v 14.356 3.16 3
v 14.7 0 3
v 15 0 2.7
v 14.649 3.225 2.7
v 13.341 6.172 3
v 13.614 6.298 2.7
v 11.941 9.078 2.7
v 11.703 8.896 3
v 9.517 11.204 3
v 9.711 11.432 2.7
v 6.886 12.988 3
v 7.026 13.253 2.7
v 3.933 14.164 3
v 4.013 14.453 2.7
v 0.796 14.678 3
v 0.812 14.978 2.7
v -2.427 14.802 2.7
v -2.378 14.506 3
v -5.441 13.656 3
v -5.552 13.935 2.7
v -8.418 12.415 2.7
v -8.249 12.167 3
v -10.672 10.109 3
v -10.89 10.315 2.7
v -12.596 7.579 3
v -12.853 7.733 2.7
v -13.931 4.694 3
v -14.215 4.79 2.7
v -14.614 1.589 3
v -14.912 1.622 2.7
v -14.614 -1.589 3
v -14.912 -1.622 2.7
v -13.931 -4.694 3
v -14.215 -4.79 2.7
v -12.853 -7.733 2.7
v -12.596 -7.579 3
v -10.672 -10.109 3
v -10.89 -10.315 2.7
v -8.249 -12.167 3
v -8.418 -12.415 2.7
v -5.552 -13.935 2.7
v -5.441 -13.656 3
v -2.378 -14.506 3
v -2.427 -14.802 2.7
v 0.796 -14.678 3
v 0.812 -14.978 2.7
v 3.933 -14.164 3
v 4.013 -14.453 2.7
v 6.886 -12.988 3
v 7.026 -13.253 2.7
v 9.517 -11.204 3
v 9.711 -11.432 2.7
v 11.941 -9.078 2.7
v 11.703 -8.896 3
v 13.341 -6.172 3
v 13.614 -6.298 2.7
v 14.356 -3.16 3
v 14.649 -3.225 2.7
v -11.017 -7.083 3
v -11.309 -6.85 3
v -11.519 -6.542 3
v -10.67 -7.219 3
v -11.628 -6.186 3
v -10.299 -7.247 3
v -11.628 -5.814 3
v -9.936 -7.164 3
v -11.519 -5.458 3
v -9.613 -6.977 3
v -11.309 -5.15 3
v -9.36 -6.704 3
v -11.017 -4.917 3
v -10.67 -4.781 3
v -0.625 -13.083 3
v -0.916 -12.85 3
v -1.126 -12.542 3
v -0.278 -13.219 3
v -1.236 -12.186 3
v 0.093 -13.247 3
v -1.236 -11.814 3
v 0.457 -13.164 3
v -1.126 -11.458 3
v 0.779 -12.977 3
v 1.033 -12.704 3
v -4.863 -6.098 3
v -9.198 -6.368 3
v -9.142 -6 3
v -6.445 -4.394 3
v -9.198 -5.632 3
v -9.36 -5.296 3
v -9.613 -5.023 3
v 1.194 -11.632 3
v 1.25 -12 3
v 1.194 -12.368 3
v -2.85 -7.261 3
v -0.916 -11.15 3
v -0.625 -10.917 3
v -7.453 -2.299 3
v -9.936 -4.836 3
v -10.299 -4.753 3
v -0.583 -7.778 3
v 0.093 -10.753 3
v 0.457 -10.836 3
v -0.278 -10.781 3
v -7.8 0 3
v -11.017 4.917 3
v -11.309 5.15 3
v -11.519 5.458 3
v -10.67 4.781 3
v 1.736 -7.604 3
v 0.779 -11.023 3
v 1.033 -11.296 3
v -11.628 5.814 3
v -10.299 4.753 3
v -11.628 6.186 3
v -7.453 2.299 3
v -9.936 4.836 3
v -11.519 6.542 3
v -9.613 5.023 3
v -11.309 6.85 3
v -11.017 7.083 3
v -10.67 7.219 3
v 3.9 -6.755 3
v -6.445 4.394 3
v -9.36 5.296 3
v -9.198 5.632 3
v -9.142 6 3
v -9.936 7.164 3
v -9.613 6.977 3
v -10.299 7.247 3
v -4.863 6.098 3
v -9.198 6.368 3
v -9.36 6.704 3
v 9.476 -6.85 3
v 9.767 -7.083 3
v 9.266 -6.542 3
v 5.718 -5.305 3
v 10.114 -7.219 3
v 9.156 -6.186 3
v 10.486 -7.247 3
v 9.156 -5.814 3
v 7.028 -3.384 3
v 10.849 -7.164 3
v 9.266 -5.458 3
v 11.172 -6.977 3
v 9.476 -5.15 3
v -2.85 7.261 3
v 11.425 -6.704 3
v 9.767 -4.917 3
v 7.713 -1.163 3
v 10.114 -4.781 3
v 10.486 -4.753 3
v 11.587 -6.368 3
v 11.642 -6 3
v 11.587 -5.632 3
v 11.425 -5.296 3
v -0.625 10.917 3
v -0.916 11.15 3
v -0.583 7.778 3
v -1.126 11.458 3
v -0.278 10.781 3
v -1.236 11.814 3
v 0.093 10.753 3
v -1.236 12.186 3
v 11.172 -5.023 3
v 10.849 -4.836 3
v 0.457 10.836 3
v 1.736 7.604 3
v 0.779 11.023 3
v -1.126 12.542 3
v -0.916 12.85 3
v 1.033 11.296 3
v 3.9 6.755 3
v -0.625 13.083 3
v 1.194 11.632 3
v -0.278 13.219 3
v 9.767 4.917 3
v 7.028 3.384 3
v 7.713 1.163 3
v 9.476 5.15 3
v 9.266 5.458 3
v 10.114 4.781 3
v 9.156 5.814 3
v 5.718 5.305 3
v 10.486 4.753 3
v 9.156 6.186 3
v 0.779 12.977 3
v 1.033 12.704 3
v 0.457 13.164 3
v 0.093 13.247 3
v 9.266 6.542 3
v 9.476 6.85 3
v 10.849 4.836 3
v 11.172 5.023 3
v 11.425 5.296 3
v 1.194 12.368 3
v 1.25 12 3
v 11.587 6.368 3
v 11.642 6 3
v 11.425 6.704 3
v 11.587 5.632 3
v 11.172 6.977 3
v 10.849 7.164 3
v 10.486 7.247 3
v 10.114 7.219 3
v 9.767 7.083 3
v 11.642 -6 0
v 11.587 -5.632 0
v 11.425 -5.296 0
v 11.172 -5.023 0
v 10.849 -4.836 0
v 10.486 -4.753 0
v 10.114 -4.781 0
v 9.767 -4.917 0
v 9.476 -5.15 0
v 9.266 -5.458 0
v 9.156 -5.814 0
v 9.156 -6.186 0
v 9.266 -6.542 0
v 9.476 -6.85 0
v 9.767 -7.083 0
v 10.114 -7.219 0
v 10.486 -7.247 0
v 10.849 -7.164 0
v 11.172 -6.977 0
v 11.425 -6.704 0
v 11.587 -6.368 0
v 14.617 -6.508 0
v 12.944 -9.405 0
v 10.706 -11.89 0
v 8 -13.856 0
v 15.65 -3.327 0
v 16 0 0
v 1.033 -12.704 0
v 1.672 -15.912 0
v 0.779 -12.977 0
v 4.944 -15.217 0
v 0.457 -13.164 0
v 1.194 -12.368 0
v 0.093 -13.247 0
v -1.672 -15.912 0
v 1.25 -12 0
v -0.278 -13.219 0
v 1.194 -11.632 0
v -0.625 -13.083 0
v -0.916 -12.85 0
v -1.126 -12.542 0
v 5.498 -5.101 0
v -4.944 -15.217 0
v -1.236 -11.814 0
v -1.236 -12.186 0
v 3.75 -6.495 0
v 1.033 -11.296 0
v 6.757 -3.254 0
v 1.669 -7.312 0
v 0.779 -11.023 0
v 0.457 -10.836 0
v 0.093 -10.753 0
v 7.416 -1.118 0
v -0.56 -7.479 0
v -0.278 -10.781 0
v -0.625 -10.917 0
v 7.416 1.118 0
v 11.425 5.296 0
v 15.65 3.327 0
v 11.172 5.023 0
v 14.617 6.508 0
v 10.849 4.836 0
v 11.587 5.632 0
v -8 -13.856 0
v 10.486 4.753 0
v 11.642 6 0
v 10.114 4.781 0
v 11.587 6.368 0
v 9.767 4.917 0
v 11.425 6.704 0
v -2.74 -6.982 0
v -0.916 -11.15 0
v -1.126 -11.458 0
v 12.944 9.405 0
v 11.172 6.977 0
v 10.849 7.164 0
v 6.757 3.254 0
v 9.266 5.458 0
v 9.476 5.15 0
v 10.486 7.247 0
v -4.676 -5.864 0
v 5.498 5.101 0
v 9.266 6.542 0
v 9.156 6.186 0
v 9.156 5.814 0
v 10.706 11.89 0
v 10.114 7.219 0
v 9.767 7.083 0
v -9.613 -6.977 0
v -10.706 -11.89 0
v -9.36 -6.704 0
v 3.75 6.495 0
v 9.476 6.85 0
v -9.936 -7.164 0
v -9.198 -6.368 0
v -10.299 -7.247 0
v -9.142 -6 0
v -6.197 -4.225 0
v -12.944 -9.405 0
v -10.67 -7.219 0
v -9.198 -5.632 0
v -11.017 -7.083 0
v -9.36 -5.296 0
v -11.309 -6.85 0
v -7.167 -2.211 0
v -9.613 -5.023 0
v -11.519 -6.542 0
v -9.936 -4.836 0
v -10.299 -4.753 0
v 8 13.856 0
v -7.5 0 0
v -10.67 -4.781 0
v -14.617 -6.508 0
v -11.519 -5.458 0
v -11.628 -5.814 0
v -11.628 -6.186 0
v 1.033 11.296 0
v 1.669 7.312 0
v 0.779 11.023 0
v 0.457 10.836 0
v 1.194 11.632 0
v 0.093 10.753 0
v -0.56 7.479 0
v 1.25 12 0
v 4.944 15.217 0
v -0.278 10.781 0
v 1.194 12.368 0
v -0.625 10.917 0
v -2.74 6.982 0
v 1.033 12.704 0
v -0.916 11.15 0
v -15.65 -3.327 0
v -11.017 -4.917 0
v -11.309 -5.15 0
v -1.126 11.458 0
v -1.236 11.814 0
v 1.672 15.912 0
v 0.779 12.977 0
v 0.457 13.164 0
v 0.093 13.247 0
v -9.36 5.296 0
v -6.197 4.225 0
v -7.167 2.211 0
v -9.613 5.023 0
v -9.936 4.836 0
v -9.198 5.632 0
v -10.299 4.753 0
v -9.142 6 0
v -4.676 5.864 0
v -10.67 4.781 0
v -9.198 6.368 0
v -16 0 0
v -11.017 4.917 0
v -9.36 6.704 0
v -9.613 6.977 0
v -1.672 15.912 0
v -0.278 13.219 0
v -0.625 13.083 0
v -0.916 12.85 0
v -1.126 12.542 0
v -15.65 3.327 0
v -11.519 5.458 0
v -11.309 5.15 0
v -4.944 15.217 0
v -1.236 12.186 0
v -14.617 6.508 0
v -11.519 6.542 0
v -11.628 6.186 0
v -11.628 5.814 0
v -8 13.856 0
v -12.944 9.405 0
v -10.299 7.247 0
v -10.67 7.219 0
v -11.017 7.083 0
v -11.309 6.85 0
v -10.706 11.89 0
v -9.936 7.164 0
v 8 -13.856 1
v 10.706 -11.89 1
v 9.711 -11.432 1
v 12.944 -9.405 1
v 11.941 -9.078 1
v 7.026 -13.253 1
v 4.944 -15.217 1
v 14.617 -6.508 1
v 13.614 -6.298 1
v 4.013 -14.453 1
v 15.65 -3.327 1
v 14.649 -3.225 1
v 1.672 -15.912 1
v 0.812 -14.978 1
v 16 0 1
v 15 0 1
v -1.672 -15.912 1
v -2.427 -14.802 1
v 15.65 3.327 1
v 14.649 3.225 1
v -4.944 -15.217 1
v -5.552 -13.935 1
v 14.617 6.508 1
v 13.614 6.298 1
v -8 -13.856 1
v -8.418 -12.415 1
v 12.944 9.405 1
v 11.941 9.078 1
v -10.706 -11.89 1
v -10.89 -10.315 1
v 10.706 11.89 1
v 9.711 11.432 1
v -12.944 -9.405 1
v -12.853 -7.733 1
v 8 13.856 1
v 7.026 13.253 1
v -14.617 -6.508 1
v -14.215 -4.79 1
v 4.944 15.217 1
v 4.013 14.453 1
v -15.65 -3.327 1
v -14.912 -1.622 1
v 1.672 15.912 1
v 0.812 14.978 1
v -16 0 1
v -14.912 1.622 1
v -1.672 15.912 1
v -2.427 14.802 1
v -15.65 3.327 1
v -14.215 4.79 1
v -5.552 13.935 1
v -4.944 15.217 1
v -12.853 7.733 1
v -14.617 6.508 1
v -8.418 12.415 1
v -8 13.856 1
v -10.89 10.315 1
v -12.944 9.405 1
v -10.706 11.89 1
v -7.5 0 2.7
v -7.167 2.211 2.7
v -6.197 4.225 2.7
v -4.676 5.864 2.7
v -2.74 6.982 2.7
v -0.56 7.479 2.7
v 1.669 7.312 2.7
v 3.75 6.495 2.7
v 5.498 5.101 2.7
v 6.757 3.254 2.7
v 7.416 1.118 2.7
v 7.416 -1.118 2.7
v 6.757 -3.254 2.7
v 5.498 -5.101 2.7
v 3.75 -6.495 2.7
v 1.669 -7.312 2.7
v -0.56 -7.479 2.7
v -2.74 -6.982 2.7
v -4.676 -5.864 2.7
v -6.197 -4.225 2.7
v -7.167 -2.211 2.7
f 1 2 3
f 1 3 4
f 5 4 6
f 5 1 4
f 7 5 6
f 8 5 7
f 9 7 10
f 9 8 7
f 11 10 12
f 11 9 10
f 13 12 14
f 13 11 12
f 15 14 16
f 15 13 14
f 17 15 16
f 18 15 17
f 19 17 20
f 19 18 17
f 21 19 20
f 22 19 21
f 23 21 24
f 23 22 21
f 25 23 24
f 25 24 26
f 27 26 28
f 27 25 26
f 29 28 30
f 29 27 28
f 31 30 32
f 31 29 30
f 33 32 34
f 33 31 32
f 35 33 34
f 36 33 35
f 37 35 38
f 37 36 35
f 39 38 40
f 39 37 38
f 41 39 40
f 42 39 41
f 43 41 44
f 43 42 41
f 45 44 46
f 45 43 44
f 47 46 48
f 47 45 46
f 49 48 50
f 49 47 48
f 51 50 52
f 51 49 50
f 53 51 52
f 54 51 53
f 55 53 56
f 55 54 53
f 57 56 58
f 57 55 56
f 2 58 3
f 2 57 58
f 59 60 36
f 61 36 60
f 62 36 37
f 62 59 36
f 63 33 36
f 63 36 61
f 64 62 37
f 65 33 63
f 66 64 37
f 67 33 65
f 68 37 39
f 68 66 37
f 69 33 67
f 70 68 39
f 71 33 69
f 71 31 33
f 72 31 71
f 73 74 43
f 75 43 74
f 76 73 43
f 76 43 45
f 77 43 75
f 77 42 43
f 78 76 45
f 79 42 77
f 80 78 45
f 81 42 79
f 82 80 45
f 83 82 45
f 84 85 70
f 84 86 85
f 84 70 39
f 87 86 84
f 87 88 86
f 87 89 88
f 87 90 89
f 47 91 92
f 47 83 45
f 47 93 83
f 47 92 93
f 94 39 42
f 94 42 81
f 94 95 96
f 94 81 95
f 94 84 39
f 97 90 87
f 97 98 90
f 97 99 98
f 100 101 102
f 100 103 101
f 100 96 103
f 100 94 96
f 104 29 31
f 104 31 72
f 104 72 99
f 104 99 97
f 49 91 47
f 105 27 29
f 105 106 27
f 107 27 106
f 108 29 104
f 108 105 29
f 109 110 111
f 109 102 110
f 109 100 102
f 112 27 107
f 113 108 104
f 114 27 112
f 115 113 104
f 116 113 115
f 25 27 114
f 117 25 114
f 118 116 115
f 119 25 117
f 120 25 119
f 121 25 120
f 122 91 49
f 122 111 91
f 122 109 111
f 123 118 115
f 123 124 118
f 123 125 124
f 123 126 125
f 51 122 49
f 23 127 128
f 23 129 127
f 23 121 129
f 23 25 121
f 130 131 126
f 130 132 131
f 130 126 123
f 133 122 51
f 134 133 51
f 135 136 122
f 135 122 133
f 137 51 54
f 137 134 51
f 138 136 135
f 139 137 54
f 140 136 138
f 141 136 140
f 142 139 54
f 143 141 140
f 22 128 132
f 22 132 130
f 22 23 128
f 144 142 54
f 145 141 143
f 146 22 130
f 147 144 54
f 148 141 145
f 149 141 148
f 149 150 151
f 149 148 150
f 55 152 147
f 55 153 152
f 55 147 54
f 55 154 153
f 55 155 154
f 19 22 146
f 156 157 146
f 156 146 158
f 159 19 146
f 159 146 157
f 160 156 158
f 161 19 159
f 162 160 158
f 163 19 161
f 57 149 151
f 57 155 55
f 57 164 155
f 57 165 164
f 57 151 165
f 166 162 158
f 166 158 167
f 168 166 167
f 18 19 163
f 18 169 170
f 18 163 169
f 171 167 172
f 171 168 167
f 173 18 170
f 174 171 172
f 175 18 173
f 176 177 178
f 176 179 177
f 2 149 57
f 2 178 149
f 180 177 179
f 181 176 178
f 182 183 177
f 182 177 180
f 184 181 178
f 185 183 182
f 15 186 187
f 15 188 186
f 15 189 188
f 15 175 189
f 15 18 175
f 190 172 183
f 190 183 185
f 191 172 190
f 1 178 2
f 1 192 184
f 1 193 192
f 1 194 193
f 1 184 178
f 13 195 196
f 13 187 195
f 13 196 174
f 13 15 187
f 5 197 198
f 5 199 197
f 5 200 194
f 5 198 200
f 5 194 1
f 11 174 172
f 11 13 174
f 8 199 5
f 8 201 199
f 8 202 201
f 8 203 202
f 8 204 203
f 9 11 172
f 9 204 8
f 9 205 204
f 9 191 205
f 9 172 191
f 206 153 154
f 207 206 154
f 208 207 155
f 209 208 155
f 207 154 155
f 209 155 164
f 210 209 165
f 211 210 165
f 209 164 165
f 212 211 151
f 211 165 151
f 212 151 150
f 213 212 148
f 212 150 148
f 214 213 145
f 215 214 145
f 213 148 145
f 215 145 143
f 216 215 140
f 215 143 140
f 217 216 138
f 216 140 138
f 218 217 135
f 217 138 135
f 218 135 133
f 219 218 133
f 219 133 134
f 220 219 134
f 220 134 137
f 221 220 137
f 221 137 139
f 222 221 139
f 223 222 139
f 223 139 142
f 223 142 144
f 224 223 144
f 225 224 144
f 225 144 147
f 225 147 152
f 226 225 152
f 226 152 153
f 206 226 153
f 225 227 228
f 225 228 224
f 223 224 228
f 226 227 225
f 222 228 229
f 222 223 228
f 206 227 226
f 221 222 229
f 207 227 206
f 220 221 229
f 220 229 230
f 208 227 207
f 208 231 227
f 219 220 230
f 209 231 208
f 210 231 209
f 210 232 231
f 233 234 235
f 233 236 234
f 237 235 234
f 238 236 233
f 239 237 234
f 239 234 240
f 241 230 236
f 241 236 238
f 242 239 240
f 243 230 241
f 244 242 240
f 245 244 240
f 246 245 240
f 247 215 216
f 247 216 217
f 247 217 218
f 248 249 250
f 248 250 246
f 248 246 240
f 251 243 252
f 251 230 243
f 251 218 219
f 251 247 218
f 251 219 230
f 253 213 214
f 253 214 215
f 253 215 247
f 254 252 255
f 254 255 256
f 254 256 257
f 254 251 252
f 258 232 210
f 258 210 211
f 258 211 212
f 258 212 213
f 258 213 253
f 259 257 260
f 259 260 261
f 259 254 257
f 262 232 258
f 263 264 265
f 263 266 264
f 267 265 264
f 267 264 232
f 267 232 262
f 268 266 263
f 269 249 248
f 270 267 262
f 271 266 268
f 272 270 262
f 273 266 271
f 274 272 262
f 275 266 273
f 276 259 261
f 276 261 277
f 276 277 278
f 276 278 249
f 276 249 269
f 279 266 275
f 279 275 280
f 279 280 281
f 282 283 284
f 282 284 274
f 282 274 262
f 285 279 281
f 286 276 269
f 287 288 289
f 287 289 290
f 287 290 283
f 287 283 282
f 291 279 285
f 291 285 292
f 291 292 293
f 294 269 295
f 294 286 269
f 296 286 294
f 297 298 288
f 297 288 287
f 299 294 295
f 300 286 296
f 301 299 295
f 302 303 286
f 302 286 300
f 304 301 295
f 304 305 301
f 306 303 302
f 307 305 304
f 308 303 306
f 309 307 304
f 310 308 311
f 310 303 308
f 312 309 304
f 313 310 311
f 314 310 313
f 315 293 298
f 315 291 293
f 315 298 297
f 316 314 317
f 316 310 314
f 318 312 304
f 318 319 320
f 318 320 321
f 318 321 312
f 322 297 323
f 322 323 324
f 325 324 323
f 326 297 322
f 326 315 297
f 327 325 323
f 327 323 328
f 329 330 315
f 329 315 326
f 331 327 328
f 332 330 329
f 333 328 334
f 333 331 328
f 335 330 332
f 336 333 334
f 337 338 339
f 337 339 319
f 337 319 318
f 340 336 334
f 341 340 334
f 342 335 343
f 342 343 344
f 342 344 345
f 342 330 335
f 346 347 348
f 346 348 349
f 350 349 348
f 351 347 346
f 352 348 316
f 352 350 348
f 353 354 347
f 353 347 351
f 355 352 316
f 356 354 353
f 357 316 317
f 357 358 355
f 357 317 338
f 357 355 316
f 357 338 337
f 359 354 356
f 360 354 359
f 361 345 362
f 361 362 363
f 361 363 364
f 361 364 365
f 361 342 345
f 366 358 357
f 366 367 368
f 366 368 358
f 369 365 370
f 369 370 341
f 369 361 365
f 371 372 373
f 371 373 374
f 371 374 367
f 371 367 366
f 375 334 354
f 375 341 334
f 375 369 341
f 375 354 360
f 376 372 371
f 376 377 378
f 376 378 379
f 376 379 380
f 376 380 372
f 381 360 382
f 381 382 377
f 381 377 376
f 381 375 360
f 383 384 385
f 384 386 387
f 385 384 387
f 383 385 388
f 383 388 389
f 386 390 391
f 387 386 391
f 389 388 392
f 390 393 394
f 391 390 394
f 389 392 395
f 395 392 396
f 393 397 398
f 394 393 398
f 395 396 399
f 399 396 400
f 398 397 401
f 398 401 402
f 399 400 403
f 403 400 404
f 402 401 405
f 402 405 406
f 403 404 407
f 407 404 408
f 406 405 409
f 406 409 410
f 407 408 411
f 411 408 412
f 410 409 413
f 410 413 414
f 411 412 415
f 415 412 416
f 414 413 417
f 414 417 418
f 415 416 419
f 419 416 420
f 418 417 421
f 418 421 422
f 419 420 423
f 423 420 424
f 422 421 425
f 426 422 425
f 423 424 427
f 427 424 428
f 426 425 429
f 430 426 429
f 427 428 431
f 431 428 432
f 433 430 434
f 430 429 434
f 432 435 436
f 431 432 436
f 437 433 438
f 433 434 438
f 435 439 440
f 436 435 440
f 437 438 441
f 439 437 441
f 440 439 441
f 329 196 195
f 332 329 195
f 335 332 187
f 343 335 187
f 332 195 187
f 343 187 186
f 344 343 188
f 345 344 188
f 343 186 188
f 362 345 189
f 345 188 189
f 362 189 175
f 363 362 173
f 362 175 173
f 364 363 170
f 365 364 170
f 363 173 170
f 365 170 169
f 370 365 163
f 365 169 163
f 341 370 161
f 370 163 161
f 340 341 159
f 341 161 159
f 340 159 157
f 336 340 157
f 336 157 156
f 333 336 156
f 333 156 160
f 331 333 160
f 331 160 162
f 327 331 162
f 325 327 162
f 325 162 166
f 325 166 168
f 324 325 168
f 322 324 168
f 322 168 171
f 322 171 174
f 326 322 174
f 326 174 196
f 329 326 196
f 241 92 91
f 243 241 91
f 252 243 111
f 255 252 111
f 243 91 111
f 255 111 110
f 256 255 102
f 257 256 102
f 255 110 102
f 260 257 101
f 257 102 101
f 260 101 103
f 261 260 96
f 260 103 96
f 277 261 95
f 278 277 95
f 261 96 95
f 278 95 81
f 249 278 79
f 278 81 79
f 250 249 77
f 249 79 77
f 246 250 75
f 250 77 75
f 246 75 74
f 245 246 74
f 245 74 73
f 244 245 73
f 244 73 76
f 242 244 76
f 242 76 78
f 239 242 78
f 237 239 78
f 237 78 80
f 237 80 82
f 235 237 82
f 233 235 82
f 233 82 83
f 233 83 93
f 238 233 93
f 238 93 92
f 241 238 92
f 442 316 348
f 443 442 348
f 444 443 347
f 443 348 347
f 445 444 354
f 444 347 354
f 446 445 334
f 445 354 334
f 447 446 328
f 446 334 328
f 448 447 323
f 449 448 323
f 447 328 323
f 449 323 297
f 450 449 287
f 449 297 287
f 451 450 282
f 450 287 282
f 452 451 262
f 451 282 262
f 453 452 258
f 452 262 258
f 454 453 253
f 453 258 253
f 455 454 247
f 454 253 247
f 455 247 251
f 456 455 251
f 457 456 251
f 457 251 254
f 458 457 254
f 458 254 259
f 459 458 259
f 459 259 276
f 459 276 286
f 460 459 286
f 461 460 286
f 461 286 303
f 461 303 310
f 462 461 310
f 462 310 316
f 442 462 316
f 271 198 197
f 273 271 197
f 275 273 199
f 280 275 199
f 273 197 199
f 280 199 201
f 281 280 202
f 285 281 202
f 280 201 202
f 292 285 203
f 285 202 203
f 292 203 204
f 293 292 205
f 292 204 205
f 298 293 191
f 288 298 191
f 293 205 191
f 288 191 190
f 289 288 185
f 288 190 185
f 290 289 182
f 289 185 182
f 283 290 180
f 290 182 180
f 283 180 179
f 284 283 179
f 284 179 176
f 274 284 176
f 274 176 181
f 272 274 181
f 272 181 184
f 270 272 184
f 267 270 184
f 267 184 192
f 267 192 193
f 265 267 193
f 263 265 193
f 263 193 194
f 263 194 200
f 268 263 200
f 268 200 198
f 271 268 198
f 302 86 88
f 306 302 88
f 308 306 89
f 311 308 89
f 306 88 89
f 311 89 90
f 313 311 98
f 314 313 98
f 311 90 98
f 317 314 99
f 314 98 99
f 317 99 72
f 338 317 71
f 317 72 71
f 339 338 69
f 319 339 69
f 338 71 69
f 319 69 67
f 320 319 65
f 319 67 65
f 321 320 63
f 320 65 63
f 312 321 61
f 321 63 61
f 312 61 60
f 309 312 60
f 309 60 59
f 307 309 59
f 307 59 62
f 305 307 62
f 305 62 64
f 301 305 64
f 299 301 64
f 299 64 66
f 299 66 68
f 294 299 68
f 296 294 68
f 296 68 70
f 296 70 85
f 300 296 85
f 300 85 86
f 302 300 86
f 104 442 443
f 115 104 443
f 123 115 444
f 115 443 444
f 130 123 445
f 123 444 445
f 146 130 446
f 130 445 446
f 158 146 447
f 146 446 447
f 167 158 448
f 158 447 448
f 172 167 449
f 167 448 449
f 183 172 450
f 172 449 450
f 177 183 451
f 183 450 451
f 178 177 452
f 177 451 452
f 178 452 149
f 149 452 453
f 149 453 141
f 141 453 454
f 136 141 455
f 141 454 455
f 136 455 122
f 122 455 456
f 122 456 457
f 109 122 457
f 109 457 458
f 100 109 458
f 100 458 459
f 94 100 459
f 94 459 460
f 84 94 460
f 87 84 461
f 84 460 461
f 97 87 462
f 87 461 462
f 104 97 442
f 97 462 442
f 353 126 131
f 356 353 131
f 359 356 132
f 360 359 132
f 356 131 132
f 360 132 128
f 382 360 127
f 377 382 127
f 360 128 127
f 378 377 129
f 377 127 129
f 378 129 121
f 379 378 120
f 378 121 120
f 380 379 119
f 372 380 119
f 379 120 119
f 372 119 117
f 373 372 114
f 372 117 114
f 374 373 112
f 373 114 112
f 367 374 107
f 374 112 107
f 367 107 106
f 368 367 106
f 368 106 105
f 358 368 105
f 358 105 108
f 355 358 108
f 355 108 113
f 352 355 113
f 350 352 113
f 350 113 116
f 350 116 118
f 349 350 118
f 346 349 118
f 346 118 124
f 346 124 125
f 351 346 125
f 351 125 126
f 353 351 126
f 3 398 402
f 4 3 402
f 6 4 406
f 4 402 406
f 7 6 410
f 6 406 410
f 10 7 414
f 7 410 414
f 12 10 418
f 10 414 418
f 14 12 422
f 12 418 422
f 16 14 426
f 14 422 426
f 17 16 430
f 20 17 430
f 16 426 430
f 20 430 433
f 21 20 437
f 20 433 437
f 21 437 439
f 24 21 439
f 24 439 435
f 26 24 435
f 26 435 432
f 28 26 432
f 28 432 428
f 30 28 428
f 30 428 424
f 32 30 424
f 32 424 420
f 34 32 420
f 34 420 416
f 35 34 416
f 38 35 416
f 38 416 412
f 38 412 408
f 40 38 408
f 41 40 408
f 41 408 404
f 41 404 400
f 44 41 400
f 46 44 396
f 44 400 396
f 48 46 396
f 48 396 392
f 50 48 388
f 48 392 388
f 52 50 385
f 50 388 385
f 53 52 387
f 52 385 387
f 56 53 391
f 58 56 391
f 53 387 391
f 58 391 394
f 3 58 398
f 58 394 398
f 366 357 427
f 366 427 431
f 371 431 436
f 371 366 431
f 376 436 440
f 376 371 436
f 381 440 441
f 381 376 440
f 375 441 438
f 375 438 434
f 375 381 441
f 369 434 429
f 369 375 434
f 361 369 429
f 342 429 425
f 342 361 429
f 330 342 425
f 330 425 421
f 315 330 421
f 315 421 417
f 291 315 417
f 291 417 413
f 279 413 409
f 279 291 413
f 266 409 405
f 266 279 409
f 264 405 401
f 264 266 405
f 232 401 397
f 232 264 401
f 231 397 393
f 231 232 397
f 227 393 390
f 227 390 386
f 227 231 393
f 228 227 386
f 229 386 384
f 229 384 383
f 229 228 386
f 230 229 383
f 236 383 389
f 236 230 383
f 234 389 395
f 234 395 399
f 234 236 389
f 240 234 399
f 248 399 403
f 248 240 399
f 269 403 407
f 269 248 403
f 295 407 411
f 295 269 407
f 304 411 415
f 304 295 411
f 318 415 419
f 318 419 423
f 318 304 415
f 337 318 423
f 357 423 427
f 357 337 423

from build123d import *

# Parameters (mm, degrees)
SKETCH_1_R          = 15
EXTRUDE_5_DEPTH     = 3
SKETCH_8_R          = 16
EXTRUDE_7_DEPTH     = 1
SKETCH_9_R          = 7.5
CUT_EXTRUDE_3_DEPTH = 9
HOLE_WIZARD_M3_1_D  = 2.5
CHAMFER_1_SIZE      = 0.3
CHAMFER_2_SIZE      = 0.3


with BuildPart() as part:
    # 草图1 → 凸台-拉伸5 (new body)
    with BuildSketch(Plane.XY):
        Circle(SKETCH_1_R)
    extrude(amount=EXTRUDE_5_DEPTH)

    # 草图8 → 凸台-拉伸7 (add)
    with BuildSketch(Plane(origin=(0, 0, 0), x_dir=(-1, 0, 0), z_dir=(0, 0, -1))):
        Circle(SKETCH_8_R)
    extrude(amount=-EXTRUDE_7_DEPTH)

    # 草图9 → 切除-拉伸3 (cut)
    with BuildSketch(Plane(origin=(0, 0, 0), x_dir=(-1, 0, 0), z_dir=(0, 0, -1))):
        Circle(SKETCH_9_R)
    extrude(amount=-CUT_EXTRUDE_3_DEPTH, mode=Mode.SUBTRACT)

    # M3 螺纹孔1 (through all)
    with Locations(Plane(origin=(0, 0, 0), x_dir=(-1, 0, 0), z_dir=(0, 0, -1))):
        with Locations((0, 0), (0, 12), (10.392304845, 6), (10.392304845, -6), (0, -12), (-10.392304845, -6), (-10.392304845, 6)):
            Hole(HOLE_WIZARD_M3_1_D / 2)

    # 倒角1
    chamfer_1_edges = [part.edges().sort_by_distance(p)[0] for p in [
        (-15, 0, 3),
    ]]
    chamfer(chamfer_1_edges, length=CHAMFER_1_SIZE)

    # 倒角2
    chamfer_2_edges = [part.edges().sort_by_distance(p)[0] for p in [
        (7.5, 0, 3),
    ]]
    chamfer(chamfer_2_edges, length=CHAMFER_2_SIZE)


solid = part.part
